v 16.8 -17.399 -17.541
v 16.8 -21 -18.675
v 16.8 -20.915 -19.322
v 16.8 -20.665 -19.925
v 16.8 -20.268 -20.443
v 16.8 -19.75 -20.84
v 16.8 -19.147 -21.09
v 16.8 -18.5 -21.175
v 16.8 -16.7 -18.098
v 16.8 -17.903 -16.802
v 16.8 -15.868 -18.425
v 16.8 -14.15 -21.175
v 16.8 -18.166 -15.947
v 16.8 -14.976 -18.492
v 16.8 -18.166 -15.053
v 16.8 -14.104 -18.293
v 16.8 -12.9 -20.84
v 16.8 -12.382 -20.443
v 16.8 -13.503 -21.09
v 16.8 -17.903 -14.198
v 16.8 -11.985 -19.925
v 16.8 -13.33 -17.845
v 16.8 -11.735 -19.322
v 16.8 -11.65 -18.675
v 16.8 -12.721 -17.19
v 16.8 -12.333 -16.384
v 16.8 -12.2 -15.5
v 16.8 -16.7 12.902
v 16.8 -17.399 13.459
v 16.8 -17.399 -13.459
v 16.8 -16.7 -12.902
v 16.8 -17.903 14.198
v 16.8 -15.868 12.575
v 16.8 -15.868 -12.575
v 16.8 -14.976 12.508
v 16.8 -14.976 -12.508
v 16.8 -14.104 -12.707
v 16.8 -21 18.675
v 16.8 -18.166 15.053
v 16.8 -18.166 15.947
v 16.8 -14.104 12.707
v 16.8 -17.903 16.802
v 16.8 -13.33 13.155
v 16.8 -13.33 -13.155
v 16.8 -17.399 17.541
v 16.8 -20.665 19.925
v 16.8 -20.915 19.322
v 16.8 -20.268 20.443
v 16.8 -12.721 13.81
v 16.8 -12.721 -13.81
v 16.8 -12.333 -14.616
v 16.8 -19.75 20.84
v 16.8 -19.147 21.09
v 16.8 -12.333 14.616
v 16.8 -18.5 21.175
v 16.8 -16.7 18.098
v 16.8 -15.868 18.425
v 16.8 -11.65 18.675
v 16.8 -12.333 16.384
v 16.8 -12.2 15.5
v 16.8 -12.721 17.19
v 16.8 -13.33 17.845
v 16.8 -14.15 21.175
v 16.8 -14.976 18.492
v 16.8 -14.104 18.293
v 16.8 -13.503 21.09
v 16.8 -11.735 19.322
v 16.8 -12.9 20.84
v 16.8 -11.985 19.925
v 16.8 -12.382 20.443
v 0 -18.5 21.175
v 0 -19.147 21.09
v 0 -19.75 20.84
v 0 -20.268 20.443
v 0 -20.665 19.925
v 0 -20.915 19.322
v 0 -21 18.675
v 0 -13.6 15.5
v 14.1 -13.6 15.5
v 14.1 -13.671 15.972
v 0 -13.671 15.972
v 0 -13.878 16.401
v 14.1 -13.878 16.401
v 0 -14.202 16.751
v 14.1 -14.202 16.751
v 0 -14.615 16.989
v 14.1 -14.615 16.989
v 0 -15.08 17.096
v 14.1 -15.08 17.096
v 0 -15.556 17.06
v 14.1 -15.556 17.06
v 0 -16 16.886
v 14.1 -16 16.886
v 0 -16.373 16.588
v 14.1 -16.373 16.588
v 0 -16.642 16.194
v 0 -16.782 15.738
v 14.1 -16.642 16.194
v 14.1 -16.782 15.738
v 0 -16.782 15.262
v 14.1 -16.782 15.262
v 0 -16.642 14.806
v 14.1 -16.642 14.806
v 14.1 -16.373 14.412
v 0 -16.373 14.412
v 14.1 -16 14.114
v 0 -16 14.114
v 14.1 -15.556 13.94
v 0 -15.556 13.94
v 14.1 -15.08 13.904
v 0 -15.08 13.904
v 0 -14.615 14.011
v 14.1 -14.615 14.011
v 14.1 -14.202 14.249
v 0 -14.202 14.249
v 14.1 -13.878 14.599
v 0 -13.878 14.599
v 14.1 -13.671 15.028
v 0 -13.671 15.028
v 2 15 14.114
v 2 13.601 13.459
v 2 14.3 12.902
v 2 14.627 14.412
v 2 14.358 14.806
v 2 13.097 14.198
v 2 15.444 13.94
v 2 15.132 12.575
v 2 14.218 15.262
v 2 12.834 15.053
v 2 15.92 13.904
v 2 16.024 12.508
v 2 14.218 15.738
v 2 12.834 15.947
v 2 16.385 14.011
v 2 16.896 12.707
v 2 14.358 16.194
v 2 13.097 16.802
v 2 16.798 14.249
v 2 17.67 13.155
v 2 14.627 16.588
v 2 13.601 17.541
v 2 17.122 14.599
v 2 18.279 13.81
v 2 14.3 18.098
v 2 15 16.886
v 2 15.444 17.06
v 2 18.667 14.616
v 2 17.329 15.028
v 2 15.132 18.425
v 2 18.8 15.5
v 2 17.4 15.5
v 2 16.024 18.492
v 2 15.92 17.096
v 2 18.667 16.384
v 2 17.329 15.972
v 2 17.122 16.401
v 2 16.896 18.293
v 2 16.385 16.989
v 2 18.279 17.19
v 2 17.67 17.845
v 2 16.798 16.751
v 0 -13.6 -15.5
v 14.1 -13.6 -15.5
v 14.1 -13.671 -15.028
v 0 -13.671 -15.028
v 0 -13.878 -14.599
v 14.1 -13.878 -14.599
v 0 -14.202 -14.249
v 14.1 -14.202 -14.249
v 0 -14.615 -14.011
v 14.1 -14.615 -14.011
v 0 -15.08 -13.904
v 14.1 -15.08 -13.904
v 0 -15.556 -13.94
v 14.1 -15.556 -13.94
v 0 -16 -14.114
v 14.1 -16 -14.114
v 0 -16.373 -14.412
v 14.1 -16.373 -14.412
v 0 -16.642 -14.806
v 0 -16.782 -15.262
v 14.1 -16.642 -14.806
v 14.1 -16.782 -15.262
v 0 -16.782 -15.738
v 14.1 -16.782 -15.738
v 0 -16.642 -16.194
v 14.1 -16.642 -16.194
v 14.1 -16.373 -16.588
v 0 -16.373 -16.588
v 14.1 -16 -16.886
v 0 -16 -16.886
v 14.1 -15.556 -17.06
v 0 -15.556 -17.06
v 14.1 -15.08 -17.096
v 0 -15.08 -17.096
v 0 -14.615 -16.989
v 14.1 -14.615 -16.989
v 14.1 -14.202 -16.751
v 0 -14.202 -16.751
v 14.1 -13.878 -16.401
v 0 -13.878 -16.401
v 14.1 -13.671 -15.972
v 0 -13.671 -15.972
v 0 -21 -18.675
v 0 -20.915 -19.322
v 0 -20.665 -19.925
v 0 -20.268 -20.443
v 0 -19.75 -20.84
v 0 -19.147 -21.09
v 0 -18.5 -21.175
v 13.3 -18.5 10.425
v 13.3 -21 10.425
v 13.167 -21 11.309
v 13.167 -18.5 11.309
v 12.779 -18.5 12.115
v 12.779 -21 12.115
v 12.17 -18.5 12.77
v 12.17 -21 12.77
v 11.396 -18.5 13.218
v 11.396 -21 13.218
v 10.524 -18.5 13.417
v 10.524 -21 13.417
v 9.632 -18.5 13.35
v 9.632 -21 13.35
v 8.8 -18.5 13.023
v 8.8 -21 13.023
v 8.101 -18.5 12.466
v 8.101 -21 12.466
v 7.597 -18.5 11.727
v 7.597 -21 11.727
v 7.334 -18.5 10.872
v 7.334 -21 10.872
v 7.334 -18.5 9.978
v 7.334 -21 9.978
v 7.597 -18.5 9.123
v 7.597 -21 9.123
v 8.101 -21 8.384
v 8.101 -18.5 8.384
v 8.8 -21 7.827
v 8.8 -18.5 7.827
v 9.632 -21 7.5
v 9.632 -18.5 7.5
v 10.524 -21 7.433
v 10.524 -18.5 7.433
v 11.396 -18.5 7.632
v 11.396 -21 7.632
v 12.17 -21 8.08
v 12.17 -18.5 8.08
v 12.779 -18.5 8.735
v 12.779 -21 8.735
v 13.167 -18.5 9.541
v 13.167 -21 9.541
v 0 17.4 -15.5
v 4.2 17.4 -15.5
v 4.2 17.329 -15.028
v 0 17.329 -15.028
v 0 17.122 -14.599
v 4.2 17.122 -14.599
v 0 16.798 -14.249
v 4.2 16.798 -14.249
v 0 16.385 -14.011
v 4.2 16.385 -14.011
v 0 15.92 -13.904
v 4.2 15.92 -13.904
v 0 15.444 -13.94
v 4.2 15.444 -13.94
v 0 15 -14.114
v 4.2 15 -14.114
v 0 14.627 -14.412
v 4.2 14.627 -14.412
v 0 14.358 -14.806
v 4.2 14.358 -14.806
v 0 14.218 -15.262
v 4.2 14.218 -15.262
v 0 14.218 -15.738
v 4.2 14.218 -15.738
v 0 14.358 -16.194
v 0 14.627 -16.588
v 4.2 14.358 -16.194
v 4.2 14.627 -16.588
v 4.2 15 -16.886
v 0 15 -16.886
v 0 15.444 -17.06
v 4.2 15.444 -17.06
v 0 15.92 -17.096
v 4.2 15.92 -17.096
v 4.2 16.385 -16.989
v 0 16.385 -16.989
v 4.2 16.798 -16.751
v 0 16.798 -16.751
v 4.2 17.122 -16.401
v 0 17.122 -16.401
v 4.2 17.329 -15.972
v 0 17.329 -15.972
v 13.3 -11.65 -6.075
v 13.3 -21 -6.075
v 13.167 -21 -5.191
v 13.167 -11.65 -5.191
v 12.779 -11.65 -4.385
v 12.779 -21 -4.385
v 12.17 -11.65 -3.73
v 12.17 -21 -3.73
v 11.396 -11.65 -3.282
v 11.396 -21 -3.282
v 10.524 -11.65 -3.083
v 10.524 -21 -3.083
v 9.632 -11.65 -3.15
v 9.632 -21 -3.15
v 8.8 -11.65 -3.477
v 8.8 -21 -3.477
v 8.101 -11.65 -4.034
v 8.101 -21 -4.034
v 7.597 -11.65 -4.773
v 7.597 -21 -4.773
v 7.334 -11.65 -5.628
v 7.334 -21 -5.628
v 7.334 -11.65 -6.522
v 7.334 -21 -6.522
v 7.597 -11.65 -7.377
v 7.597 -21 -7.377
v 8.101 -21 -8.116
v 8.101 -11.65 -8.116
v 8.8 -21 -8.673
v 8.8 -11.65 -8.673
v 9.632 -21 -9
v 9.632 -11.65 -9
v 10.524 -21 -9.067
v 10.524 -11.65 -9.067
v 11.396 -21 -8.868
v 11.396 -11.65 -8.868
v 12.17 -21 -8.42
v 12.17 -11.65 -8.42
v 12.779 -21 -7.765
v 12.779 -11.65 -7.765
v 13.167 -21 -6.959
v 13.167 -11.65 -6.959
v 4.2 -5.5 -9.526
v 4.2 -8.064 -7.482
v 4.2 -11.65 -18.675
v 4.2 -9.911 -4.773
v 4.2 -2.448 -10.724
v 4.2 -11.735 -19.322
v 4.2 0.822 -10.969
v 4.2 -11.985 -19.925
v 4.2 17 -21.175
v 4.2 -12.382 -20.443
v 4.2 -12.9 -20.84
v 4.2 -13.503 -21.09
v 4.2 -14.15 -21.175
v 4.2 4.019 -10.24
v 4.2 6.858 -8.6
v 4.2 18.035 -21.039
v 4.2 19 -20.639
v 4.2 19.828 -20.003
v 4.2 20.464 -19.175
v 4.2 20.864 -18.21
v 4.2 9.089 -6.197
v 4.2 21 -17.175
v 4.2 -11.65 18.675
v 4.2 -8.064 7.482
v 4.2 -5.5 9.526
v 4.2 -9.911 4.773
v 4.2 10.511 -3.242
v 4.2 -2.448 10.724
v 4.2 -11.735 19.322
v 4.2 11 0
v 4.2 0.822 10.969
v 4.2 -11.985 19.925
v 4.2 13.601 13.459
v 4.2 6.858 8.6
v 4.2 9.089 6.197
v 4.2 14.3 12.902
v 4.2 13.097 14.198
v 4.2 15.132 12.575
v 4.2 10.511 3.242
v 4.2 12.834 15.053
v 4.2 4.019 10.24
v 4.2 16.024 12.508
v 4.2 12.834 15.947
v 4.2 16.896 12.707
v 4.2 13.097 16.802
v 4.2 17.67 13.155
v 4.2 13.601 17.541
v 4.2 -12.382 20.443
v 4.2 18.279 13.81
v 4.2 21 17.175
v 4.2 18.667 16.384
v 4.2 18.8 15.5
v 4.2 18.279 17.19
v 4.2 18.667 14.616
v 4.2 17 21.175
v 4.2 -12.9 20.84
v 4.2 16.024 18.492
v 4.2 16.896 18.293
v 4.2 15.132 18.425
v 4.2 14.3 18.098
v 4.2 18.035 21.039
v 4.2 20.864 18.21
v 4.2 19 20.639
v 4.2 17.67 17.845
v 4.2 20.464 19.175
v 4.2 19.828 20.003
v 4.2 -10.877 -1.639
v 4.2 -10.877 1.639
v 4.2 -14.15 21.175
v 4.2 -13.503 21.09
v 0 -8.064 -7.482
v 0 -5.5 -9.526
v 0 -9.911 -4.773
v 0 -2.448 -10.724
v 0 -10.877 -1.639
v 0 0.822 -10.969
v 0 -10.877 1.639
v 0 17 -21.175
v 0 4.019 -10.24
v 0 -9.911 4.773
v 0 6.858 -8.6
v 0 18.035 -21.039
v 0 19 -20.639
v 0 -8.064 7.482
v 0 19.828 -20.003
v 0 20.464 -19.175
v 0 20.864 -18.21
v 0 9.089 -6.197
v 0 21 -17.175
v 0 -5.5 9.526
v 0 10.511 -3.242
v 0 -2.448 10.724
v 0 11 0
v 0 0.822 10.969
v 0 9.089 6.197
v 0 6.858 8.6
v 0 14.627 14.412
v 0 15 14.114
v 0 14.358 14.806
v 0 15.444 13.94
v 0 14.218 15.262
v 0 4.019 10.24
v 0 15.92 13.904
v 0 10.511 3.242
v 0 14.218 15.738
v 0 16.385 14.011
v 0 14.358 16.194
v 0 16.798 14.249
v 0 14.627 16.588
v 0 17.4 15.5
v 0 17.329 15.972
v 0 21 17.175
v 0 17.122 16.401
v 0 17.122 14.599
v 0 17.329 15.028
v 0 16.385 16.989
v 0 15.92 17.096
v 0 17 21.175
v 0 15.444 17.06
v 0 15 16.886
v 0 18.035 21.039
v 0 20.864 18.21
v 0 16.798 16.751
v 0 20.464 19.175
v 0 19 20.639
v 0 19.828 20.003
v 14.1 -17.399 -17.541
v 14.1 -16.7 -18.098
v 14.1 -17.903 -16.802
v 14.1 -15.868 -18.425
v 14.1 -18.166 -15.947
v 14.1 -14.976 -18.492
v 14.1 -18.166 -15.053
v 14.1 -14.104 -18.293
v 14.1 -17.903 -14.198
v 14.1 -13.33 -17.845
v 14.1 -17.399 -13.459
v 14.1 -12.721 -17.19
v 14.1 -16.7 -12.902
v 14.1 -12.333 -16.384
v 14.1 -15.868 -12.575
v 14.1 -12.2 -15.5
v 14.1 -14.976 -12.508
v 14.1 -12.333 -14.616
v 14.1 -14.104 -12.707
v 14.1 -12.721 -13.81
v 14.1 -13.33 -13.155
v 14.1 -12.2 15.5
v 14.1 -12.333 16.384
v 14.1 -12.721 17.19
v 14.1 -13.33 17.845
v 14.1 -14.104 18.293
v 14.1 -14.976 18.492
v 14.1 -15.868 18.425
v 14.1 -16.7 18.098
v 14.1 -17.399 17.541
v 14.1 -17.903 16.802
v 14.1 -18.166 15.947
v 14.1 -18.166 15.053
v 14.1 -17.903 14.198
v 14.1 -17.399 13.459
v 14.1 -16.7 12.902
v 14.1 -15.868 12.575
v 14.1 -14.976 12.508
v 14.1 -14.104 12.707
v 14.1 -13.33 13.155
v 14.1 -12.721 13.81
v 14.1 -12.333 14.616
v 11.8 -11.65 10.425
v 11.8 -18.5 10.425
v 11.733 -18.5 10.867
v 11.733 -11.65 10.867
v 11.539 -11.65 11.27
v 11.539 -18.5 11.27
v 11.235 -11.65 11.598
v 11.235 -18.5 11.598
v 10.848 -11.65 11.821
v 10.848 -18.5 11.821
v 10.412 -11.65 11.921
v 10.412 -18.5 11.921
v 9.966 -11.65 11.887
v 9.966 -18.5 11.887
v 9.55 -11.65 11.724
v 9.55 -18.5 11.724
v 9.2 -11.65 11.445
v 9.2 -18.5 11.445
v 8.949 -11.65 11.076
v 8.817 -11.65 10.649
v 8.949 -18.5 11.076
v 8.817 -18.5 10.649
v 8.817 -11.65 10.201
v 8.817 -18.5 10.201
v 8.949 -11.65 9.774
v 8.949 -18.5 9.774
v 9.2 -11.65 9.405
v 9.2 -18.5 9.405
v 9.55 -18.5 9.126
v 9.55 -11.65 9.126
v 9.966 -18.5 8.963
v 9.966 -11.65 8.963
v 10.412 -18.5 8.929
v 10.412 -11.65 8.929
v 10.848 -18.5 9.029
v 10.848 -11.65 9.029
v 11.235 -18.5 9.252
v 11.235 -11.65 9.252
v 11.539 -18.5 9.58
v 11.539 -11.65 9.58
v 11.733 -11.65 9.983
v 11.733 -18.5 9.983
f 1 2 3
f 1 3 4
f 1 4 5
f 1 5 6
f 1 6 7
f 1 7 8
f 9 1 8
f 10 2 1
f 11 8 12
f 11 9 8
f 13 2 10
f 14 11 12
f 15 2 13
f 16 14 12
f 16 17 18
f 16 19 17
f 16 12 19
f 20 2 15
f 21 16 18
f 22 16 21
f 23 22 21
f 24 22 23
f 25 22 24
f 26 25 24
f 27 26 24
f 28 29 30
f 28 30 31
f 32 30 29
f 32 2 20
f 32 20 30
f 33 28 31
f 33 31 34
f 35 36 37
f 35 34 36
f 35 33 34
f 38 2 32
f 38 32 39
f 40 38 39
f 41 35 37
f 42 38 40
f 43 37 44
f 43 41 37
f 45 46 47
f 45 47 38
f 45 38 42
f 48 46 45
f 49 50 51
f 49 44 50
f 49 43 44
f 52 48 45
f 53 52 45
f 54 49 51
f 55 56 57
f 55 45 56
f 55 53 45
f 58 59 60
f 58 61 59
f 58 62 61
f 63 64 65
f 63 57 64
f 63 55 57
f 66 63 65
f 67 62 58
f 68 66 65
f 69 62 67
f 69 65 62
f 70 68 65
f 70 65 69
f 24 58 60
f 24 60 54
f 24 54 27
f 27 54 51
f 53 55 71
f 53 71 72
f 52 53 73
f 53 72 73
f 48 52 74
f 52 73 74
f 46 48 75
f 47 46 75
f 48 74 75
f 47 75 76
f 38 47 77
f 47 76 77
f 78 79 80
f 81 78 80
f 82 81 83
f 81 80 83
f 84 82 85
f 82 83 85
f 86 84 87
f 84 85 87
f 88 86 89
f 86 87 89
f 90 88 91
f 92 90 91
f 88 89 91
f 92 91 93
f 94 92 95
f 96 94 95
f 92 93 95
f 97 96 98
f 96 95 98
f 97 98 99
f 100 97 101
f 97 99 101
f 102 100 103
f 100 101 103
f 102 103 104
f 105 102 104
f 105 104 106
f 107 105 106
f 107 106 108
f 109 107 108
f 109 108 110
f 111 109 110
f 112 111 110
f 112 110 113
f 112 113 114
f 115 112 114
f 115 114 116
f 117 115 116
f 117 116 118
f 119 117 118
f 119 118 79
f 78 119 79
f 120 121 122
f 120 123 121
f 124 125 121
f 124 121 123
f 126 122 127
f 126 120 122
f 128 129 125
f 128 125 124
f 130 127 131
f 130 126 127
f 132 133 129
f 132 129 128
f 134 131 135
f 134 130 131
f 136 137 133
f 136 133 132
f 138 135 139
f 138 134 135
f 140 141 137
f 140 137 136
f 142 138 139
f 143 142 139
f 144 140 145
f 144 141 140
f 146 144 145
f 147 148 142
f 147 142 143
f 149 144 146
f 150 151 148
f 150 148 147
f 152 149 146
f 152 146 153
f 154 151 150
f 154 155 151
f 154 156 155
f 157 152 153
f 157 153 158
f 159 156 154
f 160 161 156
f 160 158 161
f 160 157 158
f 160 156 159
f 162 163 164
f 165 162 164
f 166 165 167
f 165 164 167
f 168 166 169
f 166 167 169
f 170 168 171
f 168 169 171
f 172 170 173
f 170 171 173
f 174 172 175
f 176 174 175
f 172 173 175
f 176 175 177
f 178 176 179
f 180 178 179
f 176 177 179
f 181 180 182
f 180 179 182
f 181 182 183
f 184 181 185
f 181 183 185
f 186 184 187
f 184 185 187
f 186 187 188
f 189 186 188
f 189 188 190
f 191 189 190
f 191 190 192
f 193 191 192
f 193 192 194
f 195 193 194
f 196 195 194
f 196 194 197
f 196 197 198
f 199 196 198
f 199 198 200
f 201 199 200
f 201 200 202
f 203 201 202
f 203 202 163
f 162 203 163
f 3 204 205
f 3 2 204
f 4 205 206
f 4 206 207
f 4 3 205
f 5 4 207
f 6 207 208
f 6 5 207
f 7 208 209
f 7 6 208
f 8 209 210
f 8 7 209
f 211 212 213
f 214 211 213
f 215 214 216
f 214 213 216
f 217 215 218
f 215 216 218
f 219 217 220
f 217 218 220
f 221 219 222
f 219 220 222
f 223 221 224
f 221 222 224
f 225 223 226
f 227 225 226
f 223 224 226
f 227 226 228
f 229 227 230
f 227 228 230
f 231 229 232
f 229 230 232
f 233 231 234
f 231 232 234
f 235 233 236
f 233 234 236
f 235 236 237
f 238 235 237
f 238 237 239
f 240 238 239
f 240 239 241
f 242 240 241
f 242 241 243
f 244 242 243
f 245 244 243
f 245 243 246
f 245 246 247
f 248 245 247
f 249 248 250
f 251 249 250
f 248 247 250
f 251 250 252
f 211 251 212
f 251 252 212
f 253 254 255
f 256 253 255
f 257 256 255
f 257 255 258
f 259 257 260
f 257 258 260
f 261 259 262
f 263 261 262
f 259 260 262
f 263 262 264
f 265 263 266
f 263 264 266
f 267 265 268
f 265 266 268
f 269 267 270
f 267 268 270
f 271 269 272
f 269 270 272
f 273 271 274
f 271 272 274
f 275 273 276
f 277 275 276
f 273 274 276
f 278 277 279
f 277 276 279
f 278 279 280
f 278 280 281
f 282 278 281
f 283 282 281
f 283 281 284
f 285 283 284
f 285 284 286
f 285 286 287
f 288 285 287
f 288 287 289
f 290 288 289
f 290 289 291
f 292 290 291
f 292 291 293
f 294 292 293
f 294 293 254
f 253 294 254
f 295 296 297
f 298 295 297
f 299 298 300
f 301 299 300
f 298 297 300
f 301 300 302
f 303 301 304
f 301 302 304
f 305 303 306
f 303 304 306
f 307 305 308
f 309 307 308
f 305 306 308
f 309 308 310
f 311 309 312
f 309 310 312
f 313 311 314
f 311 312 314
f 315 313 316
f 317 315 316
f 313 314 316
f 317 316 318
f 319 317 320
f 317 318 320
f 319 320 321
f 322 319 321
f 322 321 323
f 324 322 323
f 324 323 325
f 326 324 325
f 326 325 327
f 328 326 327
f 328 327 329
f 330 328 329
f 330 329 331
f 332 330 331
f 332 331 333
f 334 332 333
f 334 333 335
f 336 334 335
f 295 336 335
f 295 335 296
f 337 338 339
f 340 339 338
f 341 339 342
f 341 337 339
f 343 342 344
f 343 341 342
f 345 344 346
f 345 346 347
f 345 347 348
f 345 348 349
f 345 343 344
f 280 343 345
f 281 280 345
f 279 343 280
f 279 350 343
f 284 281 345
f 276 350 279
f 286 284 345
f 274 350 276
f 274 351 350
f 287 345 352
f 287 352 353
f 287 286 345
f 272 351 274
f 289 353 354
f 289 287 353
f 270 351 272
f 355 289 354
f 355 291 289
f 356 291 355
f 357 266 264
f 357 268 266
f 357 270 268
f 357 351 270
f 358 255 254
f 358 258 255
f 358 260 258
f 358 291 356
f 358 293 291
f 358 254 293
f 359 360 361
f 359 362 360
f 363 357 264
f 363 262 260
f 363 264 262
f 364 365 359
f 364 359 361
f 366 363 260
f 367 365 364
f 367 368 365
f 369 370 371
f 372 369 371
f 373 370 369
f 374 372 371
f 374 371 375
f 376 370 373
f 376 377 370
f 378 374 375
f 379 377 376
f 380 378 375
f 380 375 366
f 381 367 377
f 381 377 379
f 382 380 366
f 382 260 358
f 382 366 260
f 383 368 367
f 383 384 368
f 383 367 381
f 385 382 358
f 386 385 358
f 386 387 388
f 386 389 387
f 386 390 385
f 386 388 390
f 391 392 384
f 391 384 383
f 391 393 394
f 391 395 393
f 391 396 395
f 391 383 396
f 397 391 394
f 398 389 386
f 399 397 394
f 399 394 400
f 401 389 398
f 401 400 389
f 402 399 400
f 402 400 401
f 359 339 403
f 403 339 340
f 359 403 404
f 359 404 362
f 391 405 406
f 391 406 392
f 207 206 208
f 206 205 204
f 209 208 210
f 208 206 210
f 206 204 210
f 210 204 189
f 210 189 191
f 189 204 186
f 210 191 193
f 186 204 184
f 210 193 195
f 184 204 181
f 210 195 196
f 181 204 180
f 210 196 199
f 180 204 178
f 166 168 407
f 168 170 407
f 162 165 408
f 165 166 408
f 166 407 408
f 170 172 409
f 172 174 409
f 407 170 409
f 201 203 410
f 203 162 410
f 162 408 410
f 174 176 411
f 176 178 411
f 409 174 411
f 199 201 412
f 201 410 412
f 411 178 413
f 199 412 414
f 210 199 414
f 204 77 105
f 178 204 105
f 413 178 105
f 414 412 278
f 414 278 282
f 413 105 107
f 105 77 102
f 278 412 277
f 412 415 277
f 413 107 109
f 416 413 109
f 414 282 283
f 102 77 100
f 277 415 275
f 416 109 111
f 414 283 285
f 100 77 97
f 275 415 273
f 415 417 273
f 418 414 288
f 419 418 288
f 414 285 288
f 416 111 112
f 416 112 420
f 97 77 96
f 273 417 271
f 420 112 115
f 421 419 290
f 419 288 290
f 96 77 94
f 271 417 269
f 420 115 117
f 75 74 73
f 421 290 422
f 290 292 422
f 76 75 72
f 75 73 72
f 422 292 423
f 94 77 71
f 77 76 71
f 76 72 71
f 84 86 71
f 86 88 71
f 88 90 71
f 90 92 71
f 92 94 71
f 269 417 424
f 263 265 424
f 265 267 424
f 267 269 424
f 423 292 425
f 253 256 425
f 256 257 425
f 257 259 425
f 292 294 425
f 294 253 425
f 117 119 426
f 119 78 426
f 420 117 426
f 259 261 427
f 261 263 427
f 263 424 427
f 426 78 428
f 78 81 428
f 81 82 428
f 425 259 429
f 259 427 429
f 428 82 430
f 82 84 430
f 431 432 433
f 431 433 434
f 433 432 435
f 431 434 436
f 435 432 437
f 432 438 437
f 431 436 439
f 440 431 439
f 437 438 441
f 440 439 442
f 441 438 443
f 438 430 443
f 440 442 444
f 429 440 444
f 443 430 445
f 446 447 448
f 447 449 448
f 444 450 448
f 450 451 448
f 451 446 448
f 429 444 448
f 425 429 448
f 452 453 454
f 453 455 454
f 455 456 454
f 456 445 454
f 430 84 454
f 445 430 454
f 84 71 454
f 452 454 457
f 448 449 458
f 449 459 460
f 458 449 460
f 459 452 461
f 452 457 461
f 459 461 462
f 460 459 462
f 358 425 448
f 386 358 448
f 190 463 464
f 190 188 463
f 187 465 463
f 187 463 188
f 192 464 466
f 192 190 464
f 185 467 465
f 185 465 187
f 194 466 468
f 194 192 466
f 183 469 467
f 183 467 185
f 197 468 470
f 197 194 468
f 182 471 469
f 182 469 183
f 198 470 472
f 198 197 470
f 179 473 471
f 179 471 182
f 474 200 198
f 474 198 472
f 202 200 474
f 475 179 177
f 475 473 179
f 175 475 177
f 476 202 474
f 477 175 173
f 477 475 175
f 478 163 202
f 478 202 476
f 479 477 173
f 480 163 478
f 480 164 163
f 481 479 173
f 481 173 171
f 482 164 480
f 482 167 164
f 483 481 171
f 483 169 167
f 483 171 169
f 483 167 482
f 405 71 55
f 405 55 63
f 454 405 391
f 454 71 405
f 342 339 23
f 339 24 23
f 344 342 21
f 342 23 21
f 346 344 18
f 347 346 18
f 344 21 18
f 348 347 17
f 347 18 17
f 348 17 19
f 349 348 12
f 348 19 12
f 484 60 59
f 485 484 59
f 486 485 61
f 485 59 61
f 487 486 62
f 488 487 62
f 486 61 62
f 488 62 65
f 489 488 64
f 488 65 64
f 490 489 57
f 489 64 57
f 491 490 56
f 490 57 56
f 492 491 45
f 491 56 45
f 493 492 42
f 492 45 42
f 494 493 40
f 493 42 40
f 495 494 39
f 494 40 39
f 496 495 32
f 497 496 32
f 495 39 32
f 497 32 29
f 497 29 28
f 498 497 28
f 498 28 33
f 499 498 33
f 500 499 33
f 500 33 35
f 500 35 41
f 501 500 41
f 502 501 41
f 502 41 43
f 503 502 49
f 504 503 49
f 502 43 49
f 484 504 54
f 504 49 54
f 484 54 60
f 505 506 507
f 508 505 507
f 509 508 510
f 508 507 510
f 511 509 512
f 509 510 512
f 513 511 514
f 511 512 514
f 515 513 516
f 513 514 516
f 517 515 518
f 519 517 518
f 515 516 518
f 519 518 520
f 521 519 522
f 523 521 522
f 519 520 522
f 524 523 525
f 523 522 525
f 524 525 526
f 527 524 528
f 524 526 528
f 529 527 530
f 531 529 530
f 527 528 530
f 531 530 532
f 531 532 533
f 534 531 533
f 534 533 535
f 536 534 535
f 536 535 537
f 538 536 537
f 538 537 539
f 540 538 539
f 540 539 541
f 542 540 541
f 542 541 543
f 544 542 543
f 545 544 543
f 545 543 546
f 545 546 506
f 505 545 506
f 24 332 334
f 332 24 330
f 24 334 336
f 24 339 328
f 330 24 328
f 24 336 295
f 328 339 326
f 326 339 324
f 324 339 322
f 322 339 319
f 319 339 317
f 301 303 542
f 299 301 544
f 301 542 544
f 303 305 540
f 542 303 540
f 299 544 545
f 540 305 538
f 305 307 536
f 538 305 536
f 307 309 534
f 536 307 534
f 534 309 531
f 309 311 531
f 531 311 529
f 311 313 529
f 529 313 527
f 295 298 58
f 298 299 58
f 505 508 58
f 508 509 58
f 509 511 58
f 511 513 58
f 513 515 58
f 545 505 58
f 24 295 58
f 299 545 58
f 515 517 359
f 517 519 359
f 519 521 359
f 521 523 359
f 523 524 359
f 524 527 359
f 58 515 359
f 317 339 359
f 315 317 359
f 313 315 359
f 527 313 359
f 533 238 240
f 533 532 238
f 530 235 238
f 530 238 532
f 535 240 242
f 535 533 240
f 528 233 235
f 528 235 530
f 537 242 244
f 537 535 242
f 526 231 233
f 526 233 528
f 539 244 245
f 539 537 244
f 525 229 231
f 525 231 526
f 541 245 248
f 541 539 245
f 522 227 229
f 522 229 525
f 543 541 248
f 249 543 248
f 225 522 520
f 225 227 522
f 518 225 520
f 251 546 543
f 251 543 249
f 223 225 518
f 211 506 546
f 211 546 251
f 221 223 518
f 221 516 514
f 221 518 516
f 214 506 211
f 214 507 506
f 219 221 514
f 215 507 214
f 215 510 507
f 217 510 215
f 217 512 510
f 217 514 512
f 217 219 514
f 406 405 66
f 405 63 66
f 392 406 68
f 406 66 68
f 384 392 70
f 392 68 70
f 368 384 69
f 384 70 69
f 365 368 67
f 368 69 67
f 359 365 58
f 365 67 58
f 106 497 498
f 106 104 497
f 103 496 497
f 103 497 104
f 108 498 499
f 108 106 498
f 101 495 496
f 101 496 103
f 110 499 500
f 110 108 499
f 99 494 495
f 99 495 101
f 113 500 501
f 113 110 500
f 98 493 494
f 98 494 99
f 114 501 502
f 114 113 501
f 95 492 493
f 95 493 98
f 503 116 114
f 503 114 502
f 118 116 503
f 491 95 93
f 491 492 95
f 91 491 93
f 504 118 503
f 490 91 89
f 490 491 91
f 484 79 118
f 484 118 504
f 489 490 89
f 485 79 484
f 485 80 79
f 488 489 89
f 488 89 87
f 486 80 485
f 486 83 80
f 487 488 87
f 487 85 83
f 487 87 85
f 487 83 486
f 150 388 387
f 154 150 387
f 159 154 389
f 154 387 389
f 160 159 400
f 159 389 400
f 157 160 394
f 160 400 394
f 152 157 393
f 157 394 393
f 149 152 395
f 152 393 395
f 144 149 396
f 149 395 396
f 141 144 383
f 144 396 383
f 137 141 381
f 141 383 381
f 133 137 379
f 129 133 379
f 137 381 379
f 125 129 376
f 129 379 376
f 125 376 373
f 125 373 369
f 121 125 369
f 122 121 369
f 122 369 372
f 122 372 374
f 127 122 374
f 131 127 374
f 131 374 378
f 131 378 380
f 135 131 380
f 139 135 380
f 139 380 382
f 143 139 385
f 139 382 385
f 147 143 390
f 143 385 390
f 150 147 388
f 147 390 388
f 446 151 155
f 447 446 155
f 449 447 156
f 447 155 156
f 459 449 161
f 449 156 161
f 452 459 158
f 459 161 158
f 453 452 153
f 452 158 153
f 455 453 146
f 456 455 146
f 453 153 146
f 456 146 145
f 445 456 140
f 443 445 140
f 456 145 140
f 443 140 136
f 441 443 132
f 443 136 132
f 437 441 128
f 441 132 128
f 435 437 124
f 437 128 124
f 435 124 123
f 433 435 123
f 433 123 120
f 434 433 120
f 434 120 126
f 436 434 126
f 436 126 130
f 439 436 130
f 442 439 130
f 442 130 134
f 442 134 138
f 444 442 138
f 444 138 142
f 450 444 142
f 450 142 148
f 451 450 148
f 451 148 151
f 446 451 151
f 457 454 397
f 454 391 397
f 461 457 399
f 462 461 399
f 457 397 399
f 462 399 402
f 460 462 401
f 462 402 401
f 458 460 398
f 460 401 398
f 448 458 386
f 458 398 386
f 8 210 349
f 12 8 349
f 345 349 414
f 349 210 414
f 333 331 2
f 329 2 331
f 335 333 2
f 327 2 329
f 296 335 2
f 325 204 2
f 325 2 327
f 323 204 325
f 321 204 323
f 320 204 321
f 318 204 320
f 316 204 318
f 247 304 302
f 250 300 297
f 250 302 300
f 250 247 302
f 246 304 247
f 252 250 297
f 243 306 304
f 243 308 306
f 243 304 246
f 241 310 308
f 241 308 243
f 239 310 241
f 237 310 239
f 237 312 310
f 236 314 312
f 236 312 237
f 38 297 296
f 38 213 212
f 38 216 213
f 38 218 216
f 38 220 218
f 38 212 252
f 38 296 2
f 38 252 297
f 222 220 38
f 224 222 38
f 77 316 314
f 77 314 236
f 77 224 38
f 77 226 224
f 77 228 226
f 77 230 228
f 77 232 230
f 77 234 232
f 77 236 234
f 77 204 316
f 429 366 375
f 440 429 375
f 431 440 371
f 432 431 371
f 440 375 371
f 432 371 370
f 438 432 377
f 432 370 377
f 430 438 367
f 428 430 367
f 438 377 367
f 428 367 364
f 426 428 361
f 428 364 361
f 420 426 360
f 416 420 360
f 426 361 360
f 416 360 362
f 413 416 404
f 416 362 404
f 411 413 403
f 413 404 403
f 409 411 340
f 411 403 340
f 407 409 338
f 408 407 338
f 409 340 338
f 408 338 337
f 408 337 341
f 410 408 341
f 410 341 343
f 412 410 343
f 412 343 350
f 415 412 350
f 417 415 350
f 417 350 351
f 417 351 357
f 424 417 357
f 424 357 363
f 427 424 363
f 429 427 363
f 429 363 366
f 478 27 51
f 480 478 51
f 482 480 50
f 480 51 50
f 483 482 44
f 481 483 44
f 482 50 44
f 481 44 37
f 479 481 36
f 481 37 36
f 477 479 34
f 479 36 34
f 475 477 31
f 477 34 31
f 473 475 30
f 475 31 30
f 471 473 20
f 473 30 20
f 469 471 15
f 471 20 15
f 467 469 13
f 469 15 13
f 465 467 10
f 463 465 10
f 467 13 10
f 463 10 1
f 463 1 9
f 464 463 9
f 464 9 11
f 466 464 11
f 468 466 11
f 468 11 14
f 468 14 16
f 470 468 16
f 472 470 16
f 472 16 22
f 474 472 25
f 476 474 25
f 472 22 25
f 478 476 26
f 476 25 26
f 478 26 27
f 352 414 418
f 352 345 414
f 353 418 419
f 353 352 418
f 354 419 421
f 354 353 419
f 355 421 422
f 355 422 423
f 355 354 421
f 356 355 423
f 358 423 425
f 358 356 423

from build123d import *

# Parameters (mm, degrees)
F0_W      = 42
F0_H      = 42.35
F1_DEPTH  = 4.2
F2_R      = 11
F2_R_2    = 1.6
F3_DEPTH  = 4.201
F4_W      = 9.35
F4_H      = 42.35
F5_DEPTH  = 12.6
F6_R      = 1.6
F7_DEPTH  = 16.801
F8_R      = 3
F9_DEPTH  = 2.7
F10_R     = 3
F11_DEPTH = 2.2
F12_R     = 4
F13_R     = 2.5
F14_R     = 1.5
F14_R_2   = 3
F15_DEPTH = 42.001
F16_R     = 3
F17_DEPTH = 2.5


with BuildPart() as f1:
    # F0 (on Right) → F1 (new body)
    with BuildSketch(Plane.YZ):
        Rectangle(F0_W, F0_H)
    extrude(amount=F1_DEPTH)

    # F2 (on face) → F3 (cut, through all)
    with BuildSketch(Plane.YZ.offset(4.2)):
        Circle(F2_R)
        with Locations((15.8, 15.5)):
            Circle(F2_R_2)
        with Locations((15.8, -15.5)):
            Circle(F2_R_2)
    extrude(amount=-F3_DEPTH, mode=Mode.SUBTRACT)

    # F4 (on face) → F5 (join)
    with BuildSketch(Plane.YZ.offset(4.2)):
        with Locations((-16.325, 0)):
            Rectangle(F4_W, F4_H)
    extrude(amount=F5_DEPTH)

    # F6 (on face) → F7 (cut, through all)
    with BuildSketch(Plane.YZ.offset(16.8)):
        with Locations((-15.2, 15.5)):
            Circle(F6_R)
        with Locations((-15.2, -15.5)):
            Circle(F6_R)
    extrude(amount=-F7_DEPTH, mode=Mode.SUBTRACT)

    # F8 (on face) → F9 (cut)
    with BuildSketch(Plane.YZ.offset(16.8)):
        with Locations((-15.2, -15.5)):
            Circle(F8_R)
        with Locations((-15.2, 15.5)):
            Circle(F8_R)
    extrude(amount=-F9_DEPTH, mode=Mode.SUBTRACT)

    # F10 (on face) → F11 (cut)
    with BuildSketch(Plane.YZ.offset(4.2)):
        with Locations((15.8, 15.5)):
            Circle(F10_R)
    extrude(amount=-F11_DEPTH, mode=Mode.SUBTRACT)

    # F12
    f12_edges = [f1.edges().sort_by_distance(p)[0] for p in [
        (2.1, 21, 21.175),
        (2.1, 21, -21.175),
    ]]
    fillet(f12_edges, radius=F12_R)

    # F13
    f13_edges = [f1.edges().sort_by_distance(p)[0] for p in [
        (10.5, -11.65, 21.175),
        (10.5, -11.65, -21.175),
        (8.4, -21, 21.175),
        (8.4, -21, -21.175),
    ]]
    fillet(f13_edges, radius=F13_R)

    # F14 (on face) → F15 (cut, through all)
    with BuildSketch(Plane.XZ.offset(21)):
        with Locations((10.3, 10.425)):
            Circle(F14_R)
        with Locations((10.3, -6.075)):
            Circle(F14_R_2)
    extrude(amount=-F15_DEPTH, mode=Mode.SUBTRACT)

    # F16 (on face) → F17 (cut)
    with BuildSketch(Plane.XZ.offset(21)):
        with Locations((10.3, 10.425)):
            Circle(F16_R)
    extrude(amount=-F17_DEPTH, mode=Mode.SUBTRACT)


solid = f1.part
